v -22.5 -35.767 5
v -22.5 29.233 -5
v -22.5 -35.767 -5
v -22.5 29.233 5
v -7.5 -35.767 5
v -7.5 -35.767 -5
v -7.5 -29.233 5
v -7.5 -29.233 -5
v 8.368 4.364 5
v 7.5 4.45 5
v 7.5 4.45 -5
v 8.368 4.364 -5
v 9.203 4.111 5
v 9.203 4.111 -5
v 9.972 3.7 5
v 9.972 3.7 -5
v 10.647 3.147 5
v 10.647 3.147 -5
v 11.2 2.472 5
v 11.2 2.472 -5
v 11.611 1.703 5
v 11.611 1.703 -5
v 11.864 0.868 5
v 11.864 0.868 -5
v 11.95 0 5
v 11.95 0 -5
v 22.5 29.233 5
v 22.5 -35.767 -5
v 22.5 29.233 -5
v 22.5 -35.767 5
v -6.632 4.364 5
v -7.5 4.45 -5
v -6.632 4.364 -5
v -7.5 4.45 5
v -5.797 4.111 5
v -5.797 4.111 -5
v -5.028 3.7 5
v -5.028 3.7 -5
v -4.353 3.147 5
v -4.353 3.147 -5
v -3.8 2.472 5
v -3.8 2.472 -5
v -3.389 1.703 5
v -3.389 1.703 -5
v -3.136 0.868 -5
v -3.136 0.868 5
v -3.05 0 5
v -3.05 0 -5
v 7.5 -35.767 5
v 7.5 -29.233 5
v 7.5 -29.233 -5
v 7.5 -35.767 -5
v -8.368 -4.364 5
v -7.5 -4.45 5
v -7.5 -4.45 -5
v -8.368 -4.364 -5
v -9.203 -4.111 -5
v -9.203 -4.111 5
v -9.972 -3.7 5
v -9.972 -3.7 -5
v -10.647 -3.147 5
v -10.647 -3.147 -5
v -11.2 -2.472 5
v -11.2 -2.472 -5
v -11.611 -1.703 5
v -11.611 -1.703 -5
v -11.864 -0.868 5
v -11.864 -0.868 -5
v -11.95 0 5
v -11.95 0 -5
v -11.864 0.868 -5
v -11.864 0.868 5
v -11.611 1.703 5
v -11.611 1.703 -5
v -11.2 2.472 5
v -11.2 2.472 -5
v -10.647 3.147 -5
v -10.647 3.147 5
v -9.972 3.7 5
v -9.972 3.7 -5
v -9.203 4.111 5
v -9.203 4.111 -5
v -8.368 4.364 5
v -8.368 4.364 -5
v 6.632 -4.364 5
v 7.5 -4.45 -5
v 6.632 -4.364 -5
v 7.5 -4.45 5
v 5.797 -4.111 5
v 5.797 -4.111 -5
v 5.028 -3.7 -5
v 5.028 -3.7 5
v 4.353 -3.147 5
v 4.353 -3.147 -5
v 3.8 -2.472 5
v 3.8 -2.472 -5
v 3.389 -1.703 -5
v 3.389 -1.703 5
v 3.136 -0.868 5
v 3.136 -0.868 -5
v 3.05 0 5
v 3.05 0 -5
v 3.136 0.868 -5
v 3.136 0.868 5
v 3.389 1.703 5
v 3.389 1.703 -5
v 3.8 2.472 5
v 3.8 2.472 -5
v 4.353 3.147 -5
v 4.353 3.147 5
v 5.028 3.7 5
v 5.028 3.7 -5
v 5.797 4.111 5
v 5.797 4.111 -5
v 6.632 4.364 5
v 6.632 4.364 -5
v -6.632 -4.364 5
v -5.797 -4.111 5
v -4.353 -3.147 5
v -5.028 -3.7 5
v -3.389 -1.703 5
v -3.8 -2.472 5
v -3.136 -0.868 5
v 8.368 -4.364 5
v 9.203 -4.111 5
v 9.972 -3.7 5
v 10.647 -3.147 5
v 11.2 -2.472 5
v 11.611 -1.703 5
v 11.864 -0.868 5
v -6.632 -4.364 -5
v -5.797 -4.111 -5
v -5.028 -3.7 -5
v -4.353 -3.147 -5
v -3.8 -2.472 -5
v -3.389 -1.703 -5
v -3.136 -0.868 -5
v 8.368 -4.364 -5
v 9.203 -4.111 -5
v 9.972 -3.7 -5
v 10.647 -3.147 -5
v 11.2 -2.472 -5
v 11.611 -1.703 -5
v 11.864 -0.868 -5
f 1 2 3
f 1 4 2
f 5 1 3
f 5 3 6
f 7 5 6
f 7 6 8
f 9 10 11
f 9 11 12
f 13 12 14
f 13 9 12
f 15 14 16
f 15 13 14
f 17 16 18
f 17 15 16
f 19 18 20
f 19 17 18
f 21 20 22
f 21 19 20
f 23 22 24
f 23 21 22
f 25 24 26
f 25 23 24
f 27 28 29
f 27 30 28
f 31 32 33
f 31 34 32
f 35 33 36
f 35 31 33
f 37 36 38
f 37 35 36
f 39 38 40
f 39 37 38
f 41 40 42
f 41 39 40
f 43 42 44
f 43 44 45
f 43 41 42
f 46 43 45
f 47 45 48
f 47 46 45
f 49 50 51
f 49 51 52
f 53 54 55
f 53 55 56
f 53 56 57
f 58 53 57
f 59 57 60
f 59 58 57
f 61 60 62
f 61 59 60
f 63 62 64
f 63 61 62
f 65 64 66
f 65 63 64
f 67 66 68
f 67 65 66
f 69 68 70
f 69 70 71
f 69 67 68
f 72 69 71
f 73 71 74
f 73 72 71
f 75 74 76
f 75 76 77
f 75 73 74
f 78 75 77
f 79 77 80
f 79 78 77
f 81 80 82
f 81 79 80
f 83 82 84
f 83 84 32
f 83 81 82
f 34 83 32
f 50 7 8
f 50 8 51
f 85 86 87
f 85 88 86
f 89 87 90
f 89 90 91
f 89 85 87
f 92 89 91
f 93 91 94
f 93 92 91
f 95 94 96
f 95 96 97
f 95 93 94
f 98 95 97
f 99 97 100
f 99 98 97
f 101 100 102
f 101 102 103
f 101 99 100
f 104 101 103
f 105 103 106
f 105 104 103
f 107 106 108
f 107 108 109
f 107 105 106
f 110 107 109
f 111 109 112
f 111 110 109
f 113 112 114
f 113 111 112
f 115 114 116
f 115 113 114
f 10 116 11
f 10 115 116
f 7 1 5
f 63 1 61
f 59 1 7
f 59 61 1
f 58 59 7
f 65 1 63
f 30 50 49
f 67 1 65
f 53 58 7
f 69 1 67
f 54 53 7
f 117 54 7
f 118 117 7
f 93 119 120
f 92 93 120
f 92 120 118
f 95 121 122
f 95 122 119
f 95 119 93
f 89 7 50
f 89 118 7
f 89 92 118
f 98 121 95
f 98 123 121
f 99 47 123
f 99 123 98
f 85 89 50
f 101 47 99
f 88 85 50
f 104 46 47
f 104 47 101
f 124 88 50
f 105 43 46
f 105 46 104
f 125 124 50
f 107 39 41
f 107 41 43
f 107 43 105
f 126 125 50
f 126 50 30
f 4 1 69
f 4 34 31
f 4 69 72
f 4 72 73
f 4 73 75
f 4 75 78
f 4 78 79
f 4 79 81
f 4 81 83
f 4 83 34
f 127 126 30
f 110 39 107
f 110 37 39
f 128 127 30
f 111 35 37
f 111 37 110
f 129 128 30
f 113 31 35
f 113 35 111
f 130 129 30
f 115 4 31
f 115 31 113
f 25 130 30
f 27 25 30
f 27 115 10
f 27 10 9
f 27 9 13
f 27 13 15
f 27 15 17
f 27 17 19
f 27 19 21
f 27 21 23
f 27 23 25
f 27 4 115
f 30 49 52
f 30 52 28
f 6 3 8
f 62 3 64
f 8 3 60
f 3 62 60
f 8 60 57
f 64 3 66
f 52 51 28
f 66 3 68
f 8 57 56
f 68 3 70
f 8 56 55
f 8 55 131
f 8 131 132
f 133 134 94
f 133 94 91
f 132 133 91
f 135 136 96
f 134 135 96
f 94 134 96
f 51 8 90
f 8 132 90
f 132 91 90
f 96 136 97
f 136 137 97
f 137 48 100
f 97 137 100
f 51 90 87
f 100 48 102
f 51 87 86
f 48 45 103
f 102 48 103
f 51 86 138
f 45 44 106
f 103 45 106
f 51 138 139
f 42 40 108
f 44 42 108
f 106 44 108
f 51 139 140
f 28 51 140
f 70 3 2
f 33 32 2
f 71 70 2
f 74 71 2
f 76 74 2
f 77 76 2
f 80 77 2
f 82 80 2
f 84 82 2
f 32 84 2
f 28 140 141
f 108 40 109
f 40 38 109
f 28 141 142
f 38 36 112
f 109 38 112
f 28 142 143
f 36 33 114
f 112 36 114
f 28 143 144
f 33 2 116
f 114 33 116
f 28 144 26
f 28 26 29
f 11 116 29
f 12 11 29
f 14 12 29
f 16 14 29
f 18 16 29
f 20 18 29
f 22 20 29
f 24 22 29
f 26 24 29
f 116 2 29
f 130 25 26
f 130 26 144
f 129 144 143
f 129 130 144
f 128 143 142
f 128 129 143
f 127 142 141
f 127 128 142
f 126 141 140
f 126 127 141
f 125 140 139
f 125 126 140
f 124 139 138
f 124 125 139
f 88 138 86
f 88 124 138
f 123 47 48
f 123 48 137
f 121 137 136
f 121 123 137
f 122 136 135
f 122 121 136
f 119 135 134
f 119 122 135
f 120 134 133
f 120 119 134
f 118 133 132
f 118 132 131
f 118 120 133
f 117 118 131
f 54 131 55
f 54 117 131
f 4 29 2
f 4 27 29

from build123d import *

# Parameters (mm, degrees)
F1_DEPTH = 5


with BuildPart() as f1:
    # F0 (on Top) → F1 (new body, symmetric)
    with BuildSketch(Plane.XY):
        with BuildLine():
            Line((7.5, 29.233247), (-7.5, 29.233247))
            Line((-7.5, 29.233247), (-7.5, 4.45))
            ThreePointArc((-7.5, 4.45), (-4.353375, 3.146625), (-3.05, 0))
            ThreePointArc((-3.05, 0), (-4.353375, -3.146625), (-7.5, -4.45))
            Line((-7.5, -4.45), (-7.5, -29.233247))
            Line((-7.5, -29.233247), (7.5, -29.233247))
            Line((7.5, -29.233247), (7.5, -4.45))
            ThreePointArc((7.5, -4.45), (3.05, 0), (7.5, 4.45))
            Line((7.5, 4.45), (7.5, 29.233247))
        make_face()
        with BuildLine():
            Line((-7.5, 4.45), (-7.5, 29.233247))
            Line((-7.5, 29.233247), (-22.5, 29.233247))
            Line((-22.5, 29.233247), (-22.5, -35.766753))
            Line((-22.5, -35.766753), (-7.5, -35.766753))
            Line((-7.5, -35.766753), (-7.5, -29.233247))
            Line((-7.5, -29.233247), (-7.5, -4.45))
            ThreePointArc((-7.5, -4.45), (-11.95, 0), (-7.5, 4.45))
        make_face()
        with BuildLine():
            Line((22.5, 29.233247), (7.5, 29.233247))
            Line((7.5, 29.233247), (7.5, 4.45))
            ThreePointArc((7.5, 4.45), (10.646625, 3.146625), (11.95, 0))
            ThreePointArc((11.95, 0), (10.646625, -3.146625), (7.5, -4.45))
            Line((7.5, -4.45), (7.5, -29.233247))
            Line((7.5, -29.233247), (7.5, -35.766753))
            Line((7.5, -35.766753), (22.5, -35.766753))
            Line((22.5, -35.766753), (22.5, 29.233247))
        make_face()
    extrude(amount=F1_DEPTH, both=True)


solid = f1.part
